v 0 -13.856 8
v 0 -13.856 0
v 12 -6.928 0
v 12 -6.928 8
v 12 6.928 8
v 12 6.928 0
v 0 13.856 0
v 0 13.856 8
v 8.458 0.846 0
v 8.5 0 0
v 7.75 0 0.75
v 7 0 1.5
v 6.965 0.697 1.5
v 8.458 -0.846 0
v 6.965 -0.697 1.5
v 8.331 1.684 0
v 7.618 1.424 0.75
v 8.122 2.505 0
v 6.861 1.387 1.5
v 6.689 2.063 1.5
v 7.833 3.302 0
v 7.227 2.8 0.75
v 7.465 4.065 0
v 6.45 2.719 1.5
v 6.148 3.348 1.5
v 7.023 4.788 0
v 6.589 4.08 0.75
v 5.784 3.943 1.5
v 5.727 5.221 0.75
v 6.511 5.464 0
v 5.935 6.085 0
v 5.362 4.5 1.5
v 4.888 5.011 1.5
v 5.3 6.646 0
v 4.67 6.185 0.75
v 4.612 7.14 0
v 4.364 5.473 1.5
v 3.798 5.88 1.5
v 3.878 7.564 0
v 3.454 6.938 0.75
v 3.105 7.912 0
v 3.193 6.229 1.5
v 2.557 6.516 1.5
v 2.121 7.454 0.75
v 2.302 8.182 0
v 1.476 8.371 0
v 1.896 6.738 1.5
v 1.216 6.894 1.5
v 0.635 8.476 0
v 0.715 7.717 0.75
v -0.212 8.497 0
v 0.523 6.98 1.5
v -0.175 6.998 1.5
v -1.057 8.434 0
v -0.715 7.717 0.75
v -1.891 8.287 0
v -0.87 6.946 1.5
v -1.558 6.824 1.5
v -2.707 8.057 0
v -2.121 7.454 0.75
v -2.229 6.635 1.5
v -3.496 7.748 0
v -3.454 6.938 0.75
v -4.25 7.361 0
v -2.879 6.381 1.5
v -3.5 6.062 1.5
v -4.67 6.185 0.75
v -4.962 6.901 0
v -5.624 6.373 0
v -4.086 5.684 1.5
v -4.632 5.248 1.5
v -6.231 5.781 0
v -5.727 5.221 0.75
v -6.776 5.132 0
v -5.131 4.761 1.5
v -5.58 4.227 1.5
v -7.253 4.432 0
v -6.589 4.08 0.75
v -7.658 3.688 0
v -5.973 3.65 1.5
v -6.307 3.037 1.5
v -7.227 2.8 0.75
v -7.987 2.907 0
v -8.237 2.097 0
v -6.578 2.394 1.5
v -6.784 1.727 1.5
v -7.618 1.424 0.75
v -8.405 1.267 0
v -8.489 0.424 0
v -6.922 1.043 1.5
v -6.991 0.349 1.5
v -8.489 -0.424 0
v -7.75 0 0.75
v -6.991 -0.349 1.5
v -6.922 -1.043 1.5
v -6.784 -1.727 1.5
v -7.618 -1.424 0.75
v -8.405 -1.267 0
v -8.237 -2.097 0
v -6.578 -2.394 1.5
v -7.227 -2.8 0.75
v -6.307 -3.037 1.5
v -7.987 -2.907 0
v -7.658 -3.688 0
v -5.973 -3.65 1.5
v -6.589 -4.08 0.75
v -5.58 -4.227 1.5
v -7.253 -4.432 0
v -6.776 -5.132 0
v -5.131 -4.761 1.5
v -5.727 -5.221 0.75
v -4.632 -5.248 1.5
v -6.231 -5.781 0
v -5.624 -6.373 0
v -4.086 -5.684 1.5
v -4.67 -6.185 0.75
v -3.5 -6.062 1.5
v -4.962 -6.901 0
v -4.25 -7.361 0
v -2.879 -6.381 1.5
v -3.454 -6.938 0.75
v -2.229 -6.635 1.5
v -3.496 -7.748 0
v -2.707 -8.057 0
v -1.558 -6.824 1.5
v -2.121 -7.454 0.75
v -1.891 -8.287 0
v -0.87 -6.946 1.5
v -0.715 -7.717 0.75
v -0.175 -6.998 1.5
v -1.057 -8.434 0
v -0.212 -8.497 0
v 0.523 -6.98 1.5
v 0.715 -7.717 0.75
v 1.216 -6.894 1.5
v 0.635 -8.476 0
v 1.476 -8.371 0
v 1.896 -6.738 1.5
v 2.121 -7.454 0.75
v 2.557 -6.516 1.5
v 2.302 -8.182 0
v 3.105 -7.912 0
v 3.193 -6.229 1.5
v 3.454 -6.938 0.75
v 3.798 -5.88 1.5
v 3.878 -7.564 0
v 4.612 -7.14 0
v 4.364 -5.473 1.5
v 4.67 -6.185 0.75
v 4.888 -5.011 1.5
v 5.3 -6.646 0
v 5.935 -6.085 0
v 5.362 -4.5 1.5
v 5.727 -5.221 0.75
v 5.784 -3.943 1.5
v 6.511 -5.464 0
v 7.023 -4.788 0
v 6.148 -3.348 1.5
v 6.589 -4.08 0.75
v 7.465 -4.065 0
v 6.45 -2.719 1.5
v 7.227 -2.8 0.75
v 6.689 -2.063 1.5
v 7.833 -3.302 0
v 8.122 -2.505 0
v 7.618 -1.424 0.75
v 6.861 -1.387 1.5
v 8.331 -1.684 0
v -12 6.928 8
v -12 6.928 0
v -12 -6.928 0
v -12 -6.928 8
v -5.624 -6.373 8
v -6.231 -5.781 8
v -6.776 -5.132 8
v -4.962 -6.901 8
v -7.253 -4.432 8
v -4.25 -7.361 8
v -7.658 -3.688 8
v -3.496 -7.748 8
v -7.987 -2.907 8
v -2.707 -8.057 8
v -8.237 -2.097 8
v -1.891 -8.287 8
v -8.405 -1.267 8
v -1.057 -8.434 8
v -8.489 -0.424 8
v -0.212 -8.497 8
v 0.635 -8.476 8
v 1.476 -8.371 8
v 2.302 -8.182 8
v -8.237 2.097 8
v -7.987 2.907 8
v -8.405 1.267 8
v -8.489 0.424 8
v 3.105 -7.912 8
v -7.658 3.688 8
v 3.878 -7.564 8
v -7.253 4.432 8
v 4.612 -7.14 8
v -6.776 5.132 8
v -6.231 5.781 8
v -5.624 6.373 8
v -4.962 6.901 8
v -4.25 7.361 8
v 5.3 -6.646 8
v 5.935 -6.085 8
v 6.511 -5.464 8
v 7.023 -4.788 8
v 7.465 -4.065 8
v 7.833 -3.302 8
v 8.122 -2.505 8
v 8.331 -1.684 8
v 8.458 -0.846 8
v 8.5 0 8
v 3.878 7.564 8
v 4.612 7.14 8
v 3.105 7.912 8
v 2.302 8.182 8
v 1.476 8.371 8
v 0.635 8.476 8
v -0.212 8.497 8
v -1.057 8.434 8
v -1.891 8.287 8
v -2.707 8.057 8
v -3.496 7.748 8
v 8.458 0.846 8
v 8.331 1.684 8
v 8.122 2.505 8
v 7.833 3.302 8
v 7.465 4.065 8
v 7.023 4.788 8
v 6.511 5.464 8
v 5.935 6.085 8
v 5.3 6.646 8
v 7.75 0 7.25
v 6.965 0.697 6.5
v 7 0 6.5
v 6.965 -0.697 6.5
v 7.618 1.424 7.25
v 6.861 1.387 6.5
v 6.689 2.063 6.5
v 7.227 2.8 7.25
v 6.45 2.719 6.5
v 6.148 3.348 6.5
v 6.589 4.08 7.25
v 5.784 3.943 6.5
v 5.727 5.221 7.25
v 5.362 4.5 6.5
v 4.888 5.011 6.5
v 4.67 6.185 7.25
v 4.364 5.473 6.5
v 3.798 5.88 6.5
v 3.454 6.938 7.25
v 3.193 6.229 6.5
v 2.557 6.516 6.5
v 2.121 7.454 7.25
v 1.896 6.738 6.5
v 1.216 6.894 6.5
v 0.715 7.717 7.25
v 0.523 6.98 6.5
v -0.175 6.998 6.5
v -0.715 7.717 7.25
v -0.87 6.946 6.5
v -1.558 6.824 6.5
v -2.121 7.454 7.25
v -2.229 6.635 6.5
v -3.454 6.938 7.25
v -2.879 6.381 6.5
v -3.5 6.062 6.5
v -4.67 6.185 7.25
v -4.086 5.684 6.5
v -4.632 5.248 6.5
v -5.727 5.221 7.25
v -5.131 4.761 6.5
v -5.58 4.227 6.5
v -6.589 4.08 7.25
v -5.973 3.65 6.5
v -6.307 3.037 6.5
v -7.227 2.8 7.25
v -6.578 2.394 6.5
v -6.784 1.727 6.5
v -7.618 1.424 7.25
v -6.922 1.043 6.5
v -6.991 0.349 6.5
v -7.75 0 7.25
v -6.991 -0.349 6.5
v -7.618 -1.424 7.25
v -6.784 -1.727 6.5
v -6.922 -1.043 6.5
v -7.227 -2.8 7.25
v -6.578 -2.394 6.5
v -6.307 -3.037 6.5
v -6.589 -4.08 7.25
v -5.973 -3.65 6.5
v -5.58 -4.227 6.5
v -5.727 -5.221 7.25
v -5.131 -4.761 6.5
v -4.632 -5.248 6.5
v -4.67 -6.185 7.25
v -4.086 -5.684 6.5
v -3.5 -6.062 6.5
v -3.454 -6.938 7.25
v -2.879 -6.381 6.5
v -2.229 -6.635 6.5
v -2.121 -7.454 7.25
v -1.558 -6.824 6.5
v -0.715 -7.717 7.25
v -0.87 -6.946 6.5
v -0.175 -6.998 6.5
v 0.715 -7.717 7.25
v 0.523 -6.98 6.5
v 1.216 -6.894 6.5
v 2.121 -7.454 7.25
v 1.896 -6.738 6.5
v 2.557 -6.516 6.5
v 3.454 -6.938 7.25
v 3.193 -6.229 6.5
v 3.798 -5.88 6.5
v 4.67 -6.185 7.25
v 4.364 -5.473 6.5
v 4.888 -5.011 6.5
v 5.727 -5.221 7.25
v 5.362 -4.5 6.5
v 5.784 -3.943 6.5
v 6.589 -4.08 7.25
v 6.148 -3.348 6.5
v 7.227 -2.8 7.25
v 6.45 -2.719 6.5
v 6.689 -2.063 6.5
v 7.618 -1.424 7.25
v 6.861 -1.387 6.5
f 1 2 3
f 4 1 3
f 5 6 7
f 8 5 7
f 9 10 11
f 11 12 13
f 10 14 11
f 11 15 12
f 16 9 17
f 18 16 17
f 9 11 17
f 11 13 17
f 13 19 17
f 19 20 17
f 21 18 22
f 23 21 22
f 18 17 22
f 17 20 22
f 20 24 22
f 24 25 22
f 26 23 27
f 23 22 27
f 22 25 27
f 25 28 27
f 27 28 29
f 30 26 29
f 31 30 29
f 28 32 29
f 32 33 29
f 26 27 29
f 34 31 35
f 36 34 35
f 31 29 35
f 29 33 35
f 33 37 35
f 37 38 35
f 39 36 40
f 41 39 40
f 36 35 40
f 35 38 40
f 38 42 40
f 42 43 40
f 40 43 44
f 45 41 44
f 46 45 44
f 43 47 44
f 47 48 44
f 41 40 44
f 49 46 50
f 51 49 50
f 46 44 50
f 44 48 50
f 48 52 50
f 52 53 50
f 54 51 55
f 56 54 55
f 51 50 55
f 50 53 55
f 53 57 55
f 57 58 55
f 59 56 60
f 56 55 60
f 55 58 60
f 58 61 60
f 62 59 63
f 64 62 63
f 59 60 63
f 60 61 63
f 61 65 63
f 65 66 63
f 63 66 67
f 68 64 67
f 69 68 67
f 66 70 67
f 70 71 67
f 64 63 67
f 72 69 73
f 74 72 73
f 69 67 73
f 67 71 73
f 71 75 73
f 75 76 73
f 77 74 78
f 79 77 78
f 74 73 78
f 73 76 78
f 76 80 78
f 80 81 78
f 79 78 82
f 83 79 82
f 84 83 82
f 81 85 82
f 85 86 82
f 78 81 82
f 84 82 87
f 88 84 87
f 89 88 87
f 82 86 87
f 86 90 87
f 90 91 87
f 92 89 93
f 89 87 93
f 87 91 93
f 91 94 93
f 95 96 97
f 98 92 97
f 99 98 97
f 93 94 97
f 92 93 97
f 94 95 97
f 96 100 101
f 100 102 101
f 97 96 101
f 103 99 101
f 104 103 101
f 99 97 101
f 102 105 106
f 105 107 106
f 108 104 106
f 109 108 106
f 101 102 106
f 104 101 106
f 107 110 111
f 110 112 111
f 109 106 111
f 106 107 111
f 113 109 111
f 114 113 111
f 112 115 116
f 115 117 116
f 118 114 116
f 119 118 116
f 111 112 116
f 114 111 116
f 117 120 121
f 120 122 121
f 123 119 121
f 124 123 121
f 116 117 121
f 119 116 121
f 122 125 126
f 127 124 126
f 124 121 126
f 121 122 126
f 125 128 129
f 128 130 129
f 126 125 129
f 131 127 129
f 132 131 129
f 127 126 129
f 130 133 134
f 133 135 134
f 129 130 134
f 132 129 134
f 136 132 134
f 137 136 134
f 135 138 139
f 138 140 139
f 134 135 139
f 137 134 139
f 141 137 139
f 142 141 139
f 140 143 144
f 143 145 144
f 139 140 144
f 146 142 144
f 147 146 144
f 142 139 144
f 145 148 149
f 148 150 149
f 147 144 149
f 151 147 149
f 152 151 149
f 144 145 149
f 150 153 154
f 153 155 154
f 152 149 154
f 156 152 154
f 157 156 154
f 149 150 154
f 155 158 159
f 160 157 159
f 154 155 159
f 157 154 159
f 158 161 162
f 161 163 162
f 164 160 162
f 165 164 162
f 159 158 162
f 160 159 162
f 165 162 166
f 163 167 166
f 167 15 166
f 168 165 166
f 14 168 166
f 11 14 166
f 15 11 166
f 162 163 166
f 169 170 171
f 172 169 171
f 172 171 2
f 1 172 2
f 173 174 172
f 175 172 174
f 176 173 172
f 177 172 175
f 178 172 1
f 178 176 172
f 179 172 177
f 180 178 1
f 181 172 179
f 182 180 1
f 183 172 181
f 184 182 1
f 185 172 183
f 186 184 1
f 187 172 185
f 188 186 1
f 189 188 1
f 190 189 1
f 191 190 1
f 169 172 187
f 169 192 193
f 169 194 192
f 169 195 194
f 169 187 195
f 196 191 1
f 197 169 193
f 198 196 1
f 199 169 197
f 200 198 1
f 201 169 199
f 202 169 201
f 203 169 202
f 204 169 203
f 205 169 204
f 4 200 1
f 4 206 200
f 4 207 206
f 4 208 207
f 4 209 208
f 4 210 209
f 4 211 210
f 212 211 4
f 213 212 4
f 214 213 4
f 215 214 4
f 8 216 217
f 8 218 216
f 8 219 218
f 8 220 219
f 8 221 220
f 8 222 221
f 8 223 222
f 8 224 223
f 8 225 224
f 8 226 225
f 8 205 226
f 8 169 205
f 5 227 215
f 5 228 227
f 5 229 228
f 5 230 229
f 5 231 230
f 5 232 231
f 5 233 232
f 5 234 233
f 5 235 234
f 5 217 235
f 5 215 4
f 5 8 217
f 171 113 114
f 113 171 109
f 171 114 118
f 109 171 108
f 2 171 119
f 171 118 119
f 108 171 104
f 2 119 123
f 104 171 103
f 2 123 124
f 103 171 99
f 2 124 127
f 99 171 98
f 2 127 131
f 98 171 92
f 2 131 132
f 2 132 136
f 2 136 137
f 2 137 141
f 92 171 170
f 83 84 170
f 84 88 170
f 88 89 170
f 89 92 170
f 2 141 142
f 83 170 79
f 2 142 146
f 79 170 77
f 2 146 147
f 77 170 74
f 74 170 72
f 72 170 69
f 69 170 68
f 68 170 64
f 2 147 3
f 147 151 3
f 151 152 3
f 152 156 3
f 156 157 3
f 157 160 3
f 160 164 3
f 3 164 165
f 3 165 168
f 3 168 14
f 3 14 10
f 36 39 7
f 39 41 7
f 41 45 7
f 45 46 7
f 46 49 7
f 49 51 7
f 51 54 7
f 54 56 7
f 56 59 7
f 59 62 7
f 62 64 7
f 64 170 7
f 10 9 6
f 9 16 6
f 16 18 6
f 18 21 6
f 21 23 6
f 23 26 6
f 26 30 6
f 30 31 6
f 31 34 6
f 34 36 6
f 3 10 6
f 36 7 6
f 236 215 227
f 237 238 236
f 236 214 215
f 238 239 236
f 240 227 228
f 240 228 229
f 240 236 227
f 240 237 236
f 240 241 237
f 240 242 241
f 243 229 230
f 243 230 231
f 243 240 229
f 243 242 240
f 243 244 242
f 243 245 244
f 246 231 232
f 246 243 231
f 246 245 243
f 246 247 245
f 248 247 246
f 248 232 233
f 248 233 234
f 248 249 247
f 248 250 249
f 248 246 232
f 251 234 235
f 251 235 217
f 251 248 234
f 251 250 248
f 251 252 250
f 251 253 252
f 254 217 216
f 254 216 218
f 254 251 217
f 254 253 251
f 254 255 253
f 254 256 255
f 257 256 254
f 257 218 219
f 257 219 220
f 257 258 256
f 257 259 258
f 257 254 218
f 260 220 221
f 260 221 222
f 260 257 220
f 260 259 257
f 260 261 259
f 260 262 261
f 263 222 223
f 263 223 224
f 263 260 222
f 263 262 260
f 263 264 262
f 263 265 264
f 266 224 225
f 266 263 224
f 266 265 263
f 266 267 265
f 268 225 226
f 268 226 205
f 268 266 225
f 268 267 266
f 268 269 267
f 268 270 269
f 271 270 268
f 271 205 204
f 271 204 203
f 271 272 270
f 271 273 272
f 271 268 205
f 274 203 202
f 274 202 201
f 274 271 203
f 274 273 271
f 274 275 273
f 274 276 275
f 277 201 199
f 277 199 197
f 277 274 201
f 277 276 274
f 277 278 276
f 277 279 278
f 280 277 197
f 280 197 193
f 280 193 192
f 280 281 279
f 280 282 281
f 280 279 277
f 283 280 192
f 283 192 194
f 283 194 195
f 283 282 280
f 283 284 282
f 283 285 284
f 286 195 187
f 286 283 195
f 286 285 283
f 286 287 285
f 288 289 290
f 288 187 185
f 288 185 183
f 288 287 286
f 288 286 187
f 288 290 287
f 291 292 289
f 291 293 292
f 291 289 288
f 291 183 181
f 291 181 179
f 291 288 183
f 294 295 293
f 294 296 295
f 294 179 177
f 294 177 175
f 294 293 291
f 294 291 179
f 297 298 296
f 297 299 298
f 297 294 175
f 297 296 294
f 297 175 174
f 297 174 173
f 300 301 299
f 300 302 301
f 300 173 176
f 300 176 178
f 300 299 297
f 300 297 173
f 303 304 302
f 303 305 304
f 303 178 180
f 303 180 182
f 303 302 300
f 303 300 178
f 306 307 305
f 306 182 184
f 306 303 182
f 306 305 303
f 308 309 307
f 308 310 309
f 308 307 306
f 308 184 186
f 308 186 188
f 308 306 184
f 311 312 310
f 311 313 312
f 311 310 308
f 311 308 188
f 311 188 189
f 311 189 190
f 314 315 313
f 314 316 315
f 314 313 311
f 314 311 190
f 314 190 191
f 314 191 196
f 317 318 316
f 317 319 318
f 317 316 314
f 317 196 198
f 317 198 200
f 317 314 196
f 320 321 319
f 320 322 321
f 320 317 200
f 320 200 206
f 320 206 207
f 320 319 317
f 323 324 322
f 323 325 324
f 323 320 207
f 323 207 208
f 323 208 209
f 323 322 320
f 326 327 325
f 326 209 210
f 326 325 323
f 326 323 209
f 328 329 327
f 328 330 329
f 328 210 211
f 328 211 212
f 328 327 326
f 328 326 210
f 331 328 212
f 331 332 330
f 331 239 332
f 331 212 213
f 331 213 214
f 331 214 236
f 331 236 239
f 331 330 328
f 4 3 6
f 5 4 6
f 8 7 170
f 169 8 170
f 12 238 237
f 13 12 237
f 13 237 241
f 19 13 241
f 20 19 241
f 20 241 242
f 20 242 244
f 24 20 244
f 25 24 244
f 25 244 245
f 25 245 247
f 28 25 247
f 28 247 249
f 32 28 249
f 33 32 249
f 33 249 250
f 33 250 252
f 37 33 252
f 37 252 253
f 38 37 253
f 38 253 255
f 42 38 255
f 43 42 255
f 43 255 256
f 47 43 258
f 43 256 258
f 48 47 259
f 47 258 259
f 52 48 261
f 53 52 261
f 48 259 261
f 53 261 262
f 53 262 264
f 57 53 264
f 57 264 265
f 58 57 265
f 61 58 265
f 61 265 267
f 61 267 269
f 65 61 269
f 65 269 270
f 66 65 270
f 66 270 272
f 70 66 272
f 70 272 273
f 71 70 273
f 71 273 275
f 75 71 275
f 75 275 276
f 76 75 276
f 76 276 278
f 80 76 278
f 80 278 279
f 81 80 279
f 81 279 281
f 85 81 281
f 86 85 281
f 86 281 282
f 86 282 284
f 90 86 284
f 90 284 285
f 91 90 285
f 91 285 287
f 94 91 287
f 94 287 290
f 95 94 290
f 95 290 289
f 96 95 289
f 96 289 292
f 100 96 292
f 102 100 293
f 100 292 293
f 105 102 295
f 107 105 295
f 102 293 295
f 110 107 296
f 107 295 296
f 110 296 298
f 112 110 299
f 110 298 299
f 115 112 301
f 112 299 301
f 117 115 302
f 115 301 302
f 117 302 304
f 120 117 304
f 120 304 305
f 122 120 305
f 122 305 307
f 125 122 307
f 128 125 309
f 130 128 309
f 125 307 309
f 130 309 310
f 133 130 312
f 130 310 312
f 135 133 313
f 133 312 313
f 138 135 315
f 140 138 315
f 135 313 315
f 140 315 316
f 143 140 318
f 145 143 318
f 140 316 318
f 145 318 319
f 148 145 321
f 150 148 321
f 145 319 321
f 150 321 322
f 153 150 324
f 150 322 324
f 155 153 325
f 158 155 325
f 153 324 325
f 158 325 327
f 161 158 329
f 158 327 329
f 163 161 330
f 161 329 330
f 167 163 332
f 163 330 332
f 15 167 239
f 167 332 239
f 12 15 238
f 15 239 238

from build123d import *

# Parameters (mm, degrees)
EXTRUDE_1_DEPTH    = 8
HOLE_WIZARD_M161_D = 14
CHAMFER_1_SIZE     = 1.5


with BuildPart() as part:
    # Эскиз1 → Бобышка-Вытянуть1 (new body)
    with BuildSketch(Plane.XY):
        Polygon((0, 13.856406461), (-12, 6.92820323), (-12, -6.92820323), (0, -13.856406461), (12, -6.92820323), (12, 6.92820323), align=None)
    extrude(amount=EXTRUDE_1_DEPTH)

    # Отверстие обработанное метчиком M161 (through all)
    with Locations(Plane(origin=(0, 0, 0), x_dir=(-1, 0, 0), z_dir=(0, 0, -1))):
        with Locations((0, 0)):
            Hole(HOLE_WIZARD_M161_D / 2)

    # Фаска1
    chamfer_1_edges = [part.edges().sort_by_distance(p)[0] for p in [
        (-7, 0, 0),
        (-7, 0, 8),
    ]]
    chamfer(chamfer_1_edges, length=CHAMFER_1_SIZE)


solid = part.part
